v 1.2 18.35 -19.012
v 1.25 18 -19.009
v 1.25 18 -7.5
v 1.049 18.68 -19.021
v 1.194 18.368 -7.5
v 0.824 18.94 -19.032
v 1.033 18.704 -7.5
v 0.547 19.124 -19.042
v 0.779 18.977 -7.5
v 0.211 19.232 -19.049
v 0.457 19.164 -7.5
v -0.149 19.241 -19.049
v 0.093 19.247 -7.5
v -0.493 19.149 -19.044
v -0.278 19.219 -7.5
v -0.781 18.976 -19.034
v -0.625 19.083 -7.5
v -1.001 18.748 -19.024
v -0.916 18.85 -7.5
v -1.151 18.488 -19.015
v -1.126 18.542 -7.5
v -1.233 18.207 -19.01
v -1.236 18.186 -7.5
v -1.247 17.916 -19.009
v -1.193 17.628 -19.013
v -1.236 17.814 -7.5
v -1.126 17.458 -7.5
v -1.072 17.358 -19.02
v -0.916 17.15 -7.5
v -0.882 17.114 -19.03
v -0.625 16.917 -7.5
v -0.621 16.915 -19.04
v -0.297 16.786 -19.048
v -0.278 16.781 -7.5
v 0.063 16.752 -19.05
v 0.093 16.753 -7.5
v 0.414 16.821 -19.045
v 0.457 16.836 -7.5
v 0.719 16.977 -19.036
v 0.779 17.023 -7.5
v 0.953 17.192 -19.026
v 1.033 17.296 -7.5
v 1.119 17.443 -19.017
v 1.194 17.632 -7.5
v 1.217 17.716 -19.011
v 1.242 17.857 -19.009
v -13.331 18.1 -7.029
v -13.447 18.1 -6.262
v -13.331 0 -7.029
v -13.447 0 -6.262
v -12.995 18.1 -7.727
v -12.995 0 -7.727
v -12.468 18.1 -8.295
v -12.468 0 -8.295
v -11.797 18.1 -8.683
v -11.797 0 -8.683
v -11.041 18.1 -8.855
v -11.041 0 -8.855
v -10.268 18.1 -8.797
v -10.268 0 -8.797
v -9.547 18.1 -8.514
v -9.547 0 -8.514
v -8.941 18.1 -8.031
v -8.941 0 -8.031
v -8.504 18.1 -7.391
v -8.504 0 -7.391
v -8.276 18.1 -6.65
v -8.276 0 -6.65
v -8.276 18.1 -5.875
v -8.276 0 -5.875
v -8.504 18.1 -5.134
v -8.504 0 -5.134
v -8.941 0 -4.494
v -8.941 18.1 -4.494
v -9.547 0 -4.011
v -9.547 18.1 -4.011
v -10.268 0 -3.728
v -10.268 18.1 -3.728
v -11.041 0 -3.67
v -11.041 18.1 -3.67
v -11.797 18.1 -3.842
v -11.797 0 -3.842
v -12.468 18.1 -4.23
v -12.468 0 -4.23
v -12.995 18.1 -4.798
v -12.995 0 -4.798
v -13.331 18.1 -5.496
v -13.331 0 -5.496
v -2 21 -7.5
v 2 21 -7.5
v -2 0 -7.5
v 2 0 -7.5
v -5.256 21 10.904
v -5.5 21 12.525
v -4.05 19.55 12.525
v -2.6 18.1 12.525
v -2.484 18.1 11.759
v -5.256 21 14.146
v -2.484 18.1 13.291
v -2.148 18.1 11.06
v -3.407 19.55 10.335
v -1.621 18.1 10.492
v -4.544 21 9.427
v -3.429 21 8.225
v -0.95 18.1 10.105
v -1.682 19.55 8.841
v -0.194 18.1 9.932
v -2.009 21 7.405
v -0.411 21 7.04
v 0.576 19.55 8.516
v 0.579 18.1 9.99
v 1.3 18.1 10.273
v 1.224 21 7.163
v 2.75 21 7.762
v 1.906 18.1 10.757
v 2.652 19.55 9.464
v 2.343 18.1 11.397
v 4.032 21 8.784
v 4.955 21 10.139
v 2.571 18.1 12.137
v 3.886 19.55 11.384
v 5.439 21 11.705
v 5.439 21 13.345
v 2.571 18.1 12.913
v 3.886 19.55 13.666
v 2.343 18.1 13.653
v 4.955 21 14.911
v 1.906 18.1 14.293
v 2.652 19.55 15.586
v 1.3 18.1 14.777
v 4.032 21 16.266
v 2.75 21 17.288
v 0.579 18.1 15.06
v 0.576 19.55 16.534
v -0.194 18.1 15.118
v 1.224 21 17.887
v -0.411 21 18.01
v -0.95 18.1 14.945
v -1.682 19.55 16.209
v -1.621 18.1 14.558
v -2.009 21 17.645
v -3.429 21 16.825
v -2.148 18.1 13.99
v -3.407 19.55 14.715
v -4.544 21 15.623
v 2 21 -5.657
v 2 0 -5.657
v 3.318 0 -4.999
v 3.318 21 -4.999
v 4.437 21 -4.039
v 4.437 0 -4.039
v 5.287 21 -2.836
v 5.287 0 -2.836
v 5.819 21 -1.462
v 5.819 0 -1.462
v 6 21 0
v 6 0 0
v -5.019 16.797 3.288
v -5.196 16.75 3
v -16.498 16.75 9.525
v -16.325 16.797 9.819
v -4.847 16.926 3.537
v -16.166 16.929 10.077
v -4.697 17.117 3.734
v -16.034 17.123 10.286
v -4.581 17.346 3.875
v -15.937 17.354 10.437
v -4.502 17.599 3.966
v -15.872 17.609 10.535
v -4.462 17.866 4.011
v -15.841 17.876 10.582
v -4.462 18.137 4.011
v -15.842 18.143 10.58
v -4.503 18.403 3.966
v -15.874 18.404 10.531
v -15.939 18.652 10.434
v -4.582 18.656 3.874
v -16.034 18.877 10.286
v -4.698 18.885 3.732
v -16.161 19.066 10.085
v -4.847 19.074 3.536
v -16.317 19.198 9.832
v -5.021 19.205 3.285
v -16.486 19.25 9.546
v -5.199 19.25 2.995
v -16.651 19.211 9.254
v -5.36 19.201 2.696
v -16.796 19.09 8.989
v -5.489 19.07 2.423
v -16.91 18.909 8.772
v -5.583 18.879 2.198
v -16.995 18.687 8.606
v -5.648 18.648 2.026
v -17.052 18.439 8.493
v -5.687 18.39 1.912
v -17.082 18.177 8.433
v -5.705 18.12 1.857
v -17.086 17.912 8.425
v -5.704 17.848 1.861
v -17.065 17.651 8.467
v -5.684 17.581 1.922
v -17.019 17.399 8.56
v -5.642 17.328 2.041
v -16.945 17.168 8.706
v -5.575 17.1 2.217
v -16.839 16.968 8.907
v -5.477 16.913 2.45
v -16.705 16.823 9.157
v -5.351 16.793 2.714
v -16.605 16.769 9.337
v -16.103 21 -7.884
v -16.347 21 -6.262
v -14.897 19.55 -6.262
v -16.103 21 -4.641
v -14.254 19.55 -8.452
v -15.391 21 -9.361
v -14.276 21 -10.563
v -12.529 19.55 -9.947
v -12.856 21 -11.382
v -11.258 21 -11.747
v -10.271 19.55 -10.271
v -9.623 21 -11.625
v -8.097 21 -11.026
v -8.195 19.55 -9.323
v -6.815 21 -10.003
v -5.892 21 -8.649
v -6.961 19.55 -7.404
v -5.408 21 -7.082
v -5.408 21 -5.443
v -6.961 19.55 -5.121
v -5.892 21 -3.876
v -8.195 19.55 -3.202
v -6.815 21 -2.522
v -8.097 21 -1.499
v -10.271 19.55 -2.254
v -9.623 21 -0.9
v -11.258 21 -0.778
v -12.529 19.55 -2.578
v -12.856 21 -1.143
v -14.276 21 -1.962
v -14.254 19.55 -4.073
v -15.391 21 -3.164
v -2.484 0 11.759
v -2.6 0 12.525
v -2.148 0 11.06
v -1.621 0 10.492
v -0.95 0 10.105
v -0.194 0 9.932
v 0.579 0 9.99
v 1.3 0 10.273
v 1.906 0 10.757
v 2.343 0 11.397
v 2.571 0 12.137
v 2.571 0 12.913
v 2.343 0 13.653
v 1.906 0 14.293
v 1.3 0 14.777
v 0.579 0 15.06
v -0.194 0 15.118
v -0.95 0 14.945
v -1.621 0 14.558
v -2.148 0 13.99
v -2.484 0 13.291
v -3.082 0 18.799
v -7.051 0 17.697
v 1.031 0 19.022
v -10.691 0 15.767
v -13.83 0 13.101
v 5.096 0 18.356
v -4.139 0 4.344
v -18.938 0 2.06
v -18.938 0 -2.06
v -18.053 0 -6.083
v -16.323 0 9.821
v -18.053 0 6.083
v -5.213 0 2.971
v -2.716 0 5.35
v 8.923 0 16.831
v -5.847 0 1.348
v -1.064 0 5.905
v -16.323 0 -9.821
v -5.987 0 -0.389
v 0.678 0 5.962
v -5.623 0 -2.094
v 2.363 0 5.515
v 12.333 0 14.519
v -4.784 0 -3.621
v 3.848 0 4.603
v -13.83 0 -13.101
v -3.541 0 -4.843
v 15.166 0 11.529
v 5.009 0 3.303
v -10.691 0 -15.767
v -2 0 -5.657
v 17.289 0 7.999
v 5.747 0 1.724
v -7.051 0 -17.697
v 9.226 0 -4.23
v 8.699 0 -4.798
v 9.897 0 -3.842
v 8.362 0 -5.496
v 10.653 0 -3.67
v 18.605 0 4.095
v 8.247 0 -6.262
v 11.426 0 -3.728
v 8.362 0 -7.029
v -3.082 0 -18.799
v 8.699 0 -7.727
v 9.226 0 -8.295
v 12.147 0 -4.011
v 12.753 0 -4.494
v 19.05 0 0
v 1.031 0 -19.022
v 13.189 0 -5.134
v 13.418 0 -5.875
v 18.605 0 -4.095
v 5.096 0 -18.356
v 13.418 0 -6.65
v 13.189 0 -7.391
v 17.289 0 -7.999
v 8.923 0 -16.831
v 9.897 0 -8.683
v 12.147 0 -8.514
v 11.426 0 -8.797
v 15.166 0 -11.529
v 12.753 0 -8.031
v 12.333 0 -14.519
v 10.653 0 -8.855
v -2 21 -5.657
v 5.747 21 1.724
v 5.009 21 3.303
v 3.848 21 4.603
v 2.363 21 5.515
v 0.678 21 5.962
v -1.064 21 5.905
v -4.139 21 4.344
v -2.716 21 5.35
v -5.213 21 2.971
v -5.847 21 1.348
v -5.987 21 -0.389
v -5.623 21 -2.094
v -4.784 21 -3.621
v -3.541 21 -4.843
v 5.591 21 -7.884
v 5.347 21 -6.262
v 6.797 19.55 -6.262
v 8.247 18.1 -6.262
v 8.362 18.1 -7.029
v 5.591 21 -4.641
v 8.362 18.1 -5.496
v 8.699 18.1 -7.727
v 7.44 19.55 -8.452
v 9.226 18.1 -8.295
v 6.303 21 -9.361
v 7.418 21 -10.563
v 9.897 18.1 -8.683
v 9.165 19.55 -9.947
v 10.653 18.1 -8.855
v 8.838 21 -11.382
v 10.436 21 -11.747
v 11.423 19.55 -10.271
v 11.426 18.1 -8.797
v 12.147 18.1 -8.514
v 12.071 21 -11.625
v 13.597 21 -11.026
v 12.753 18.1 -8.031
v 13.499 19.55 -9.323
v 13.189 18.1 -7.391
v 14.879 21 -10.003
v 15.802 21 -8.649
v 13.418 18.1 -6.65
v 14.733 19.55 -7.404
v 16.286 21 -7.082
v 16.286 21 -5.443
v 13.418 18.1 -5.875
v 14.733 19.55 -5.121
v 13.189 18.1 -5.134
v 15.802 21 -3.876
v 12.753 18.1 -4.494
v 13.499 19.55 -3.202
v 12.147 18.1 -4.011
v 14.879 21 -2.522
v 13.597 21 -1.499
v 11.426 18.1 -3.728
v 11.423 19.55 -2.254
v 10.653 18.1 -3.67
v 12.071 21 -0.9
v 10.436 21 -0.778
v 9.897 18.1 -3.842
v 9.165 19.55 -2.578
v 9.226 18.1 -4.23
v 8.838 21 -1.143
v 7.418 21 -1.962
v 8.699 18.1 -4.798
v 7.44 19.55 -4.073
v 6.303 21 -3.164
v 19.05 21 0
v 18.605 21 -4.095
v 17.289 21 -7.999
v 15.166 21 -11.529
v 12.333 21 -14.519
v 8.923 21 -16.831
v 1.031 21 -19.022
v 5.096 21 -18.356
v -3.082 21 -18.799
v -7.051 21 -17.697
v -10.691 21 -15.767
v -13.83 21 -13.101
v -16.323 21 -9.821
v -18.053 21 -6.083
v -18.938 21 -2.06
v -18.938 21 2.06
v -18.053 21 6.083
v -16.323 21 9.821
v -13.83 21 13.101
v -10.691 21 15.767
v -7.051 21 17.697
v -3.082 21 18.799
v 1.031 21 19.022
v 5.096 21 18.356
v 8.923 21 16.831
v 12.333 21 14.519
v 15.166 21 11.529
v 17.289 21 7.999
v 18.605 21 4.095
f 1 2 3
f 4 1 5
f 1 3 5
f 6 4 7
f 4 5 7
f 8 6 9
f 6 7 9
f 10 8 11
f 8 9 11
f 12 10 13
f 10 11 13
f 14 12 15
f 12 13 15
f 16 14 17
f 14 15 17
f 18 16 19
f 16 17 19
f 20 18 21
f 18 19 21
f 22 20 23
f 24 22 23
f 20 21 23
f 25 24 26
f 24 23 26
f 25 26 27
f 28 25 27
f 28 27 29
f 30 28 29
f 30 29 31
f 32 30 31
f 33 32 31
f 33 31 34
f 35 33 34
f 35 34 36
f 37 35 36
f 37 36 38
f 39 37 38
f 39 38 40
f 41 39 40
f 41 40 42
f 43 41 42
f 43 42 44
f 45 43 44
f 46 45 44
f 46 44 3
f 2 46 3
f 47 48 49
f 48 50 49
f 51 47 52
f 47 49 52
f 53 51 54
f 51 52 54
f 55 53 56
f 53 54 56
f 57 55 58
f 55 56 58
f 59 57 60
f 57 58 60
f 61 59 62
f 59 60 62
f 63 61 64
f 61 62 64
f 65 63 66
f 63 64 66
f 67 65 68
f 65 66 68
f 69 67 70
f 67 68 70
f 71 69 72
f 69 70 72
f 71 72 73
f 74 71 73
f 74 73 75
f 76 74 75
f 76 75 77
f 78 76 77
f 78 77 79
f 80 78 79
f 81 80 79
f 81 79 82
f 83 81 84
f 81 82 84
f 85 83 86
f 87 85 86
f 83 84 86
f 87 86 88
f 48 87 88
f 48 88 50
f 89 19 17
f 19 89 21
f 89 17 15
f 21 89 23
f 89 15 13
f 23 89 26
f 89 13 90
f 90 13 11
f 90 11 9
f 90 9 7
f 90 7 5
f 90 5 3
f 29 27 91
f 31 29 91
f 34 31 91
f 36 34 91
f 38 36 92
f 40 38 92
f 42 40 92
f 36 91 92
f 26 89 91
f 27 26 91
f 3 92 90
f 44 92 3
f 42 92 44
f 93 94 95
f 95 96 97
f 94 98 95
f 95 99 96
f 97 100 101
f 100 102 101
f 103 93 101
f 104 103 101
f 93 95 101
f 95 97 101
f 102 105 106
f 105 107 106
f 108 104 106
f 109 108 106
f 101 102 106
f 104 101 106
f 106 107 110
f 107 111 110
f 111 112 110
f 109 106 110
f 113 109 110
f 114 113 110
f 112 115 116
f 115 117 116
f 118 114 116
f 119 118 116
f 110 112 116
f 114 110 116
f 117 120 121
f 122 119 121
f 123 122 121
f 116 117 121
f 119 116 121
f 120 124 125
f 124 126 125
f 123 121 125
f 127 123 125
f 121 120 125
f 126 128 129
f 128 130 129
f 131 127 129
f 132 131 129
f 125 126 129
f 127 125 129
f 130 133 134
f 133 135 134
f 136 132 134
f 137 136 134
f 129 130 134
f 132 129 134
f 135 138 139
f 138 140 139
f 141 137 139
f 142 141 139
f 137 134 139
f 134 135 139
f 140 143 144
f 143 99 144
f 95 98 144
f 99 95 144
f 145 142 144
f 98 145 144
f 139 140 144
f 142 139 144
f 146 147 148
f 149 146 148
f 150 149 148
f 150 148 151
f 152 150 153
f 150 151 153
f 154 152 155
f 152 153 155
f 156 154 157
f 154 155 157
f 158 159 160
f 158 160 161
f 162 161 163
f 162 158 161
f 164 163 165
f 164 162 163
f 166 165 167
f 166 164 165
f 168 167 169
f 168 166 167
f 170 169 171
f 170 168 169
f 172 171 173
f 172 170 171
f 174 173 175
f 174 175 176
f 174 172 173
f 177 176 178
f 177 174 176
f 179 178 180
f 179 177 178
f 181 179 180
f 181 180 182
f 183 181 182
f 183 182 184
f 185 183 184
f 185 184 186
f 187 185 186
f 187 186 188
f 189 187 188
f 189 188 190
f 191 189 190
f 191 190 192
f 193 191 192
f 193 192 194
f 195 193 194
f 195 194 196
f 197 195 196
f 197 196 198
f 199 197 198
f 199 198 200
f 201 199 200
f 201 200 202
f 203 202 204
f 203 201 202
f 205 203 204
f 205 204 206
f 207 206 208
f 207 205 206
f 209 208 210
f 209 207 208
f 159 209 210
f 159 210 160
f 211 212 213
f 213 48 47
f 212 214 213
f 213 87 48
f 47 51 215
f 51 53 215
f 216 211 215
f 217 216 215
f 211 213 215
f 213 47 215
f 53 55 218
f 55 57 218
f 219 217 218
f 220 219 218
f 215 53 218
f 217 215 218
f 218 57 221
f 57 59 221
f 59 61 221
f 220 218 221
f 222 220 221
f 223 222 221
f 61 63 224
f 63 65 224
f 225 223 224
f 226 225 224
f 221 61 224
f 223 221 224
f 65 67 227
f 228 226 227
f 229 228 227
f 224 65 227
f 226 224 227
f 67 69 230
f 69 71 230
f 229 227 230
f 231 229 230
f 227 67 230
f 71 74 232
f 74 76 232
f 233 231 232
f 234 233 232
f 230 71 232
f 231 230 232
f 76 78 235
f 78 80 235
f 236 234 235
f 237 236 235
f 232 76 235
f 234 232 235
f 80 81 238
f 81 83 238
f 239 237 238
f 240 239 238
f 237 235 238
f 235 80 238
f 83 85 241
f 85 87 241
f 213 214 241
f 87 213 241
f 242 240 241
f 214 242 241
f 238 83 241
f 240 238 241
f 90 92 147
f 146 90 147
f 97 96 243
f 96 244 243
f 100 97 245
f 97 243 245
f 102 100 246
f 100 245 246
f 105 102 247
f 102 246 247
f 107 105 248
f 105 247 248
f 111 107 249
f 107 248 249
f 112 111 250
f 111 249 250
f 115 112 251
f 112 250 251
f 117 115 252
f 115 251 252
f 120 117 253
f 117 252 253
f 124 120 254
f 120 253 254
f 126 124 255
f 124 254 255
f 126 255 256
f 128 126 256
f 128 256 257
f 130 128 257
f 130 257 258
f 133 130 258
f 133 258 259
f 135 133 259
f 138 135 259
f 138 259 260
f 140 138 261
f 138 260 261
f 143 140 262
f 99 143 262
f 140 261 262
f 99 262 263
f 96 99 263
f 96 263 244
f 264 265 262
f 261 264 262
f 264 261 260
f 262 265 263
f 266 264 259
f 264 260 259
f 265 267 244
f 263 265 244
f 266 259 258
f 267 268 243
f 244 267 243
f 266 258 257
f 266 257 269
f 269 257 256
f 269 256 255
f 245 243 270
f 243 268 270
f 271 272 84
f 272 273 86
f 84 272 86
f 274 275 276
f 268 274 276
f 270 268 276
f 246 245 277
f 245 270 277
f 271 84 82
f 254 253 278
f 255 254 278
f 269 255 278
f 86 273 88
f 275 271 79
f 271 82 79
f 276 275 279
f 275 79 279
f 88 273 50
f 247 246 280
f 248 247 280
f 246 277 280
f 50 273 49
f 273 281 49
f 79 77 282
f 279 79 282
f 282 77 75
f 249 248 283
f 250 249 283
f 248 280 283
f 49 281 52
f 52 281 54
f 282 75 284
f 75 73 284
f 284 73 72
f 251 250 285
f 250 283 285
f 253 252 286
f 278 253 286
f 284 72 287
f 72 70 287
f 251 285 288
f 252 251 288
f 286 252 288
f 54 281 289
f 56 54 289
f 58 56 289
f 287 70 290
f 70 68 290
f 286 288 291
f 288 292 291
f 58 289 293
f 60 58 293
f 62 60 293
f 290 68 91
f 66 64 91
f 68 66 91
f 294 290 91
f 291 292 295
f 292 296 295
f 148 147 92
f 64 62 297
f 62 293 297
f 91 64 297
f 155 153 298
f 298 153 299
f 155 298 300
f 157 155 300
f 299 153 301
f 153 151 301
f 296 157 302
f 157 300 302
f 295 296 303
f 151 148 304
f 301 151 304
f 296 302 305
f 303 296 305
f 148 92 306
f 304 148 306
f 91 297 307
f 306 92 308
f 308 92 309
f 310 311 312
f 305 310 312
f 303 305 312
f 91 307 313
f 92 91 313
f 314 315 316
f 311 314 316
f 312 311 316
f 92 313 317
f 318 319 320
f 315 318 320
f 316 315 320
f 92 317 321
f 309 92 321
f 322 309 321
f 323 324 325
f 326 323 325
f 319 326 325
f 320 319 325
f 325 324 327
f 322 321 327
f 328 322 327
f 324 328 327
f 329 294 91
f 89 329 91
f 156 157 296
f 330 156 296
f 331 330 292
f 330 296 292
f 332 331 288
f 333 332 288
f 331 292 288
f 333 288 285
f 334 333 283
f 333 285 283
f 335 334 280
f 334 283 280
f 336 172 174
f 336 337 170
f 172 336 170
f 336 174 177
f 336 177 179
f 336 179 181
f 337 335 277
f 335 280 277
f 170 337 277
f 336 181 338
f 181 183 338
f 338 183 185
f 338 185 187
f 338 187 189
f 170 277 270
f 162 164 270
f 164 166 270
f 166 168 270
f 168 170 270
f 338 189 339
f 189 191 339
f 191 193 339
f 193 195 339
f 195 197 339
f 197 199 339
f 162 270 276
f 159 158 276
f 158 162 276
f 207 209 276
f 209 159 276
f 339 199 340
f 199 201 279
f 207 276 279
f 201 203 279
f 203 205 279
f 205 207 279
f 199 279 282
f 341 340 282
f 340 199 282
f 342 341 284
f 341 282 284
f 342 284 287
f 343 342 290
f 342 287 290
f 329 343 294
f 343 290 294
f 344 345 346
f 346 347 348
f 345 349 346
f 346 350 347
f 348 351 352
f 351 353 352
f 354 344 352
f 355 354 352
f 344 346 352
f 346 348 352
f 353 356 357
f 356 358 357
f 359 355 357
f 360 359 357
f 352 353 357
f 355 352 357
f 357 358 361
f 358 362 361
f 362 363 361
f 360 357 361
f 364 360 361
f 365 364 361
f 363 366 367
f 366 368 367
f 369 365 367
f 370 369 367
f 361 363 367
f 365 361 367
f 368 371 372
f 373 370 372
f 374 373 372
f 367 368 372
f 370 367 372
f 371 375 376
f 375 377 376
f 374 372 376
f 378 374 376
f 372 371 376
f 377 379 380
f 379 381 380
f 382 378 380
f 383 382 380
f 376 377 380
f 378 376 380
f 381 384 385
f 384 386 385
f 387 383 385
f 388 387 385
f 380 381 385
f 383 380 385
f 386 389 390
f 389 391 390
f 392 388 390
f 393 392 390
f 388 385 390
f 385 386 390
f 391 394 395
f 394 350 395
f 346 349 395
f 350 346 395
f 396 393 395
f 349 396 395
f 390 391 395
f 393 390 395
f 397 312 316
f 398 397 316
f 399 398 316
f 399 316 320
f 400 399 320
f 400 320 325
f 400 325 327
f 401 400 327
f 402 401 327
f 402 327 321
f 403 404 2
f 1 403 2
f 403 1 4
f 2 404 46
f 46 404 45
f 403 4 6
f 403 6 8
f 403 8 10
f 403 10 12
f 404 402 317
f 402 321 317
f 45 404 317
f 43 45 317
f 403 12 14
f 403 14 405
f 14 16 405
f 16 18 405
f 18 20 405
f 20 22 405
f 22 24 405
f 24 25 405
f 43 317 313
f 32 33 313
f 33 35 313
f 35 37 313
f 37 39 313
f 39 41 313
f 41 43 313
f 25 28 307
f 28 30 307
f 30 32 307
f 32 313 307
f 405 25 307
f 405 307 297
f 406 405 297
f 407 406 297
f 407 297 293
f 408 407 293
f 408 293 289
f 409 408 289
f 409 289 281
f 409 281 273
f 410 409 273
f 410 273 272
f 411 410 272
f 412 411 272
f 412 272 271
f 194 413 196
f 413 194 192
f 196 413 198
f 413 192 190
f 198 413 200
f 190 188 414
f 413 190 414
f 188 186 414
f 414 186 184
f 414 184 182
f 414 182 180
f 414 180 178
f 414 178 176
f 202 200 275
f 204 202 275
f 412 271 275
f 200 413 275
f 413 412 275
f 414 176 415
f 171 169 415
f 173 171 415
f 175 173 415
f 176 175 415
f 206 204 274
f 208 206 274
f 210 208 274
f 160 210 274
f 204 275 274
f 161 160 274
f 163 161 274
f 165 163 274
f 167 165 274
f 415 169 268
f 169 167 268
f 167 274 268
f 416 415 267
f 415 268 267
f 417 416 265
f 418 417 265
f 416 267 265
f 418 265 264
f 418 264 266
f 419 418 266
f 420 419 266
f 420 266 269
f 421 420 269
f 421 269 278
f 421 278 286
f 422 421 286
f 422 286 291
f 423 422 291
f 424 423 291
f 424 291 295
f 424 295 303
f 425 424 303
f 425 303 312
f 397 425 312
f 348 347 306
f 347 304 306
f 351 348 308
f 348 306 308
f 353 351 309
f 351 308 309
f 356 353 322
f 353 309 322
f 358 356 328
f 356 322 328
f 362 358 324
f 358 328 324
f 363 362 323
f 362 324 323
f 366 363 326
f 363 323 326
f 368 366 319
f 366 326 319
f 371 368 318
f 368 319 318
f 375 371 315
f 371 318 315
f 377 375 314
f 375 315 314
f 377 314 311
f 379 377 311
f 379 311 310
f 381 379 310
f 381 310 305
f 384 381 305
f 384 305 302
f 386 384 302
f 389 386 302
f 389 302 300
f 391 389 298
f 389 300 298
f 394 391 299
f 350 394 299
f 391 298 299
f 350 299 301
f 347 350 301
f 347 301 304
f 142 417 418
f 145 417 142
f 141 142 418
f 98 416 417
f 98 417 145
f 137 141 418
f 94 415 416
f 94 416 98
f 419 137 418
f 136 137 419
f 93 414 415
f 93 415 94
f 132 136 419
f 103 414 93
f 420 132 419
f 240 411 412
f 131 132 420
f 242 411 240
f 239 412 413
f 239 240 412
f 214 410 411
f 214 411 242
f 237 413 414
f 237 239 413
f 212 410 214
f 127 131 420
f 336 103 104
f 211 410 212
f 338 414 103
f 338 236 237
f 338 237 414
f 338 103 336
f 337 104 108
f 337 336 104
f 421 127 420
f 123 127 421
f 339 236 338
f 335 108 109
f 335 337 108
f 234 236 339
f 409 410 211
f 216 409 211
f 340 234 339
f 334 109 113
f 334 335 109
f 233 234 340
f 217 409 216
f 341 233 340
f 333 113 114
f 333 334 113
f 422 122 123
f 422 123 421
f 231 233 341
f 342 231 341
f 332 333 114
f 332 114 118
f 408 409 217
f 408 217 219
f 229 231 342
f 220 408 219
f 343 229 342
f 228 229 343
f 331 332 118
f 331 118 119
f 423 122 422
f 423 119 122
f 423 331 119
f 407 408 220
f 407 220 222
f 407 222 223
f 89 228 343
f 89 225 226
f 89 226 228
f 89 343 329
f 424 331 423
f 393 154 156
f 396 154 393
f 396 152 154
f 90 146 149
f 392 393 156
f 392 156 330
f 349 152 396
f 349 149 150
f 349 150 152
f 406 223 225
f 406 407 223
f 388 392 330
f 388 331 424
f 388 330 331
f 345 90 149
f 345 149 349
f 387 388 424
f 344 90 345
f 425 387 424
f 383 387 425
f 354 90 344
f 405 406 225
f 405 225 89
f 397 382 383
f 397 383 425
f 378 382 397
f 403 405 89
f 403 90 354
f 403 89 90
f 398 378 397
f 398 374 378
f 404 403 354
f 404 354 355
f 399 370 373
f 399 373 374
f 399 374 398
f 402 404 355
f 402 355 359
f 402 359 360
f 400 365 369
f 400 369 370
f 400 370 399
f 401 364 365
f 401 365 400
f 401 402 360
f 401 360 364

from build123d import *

# Parameters (mm, degrees)
SKETCH1_R                     = 19.05
SKETCH1_R_2                   = 2.5
BOSS_EXTRUDE1_DEPTH           = 21
SKETCH2_R                     = 1.25
CUT_EXTRUDE1_DEPTH            = 3
CUT_EXTRUDE1_DEPTH_BACK       = 15
SKETCH4_R                     = 1.25
CUT_EXTRUDE2_DEPTH            = 20
CSK_FOR_M5_SFHCS1_D           = 5.2
CSK_FOR_M5_SFHCS1_CSINK_D     = 11
CSK_FOR_M5_SFHCS1_CSINK_ANGLE = 90


with BuildPart() as part:
    # Sketch1 → Boss-Extrude1 (new body)
    with BuildSketch(Plane(origin=(0, 0, 0), x_dir=(1, 0, 0), z_dir=(0, 1, 0))):
        Circle(SKETCH1_R)
        with Locations((0, -12.525)):
            Circle(SKETCH1_R_2, mode=Mode.SUBTRACT)
        with Locations((-10.846968182, 6.2625)):
            Circle(SKETCH1_R_2, mode=Mode.SUBTRACT)
        with BuildLine():
            Line((-2, 5.656854249), (-2, 7.5))
            Line((-2, 7.5), (-1, 7.5))
            Line((-1, 7.5), (1, 7.5))
            Line((1, 7.5), (2, 7.5))
            Line((2, 7.5), (2, 5.656854249))
            ThreePointArc((2, 5.656854249), (4.898979486, 3.464101615), (6, 0))
            ThreePointArc((6, 0), (-3.464101615, -4.898979486), (-2, 5.656854249))
        make_face(mode=Mode.SUBTRACT)
        with Locations((10.846968182, 6.2625)):
            Circle(SKETCH1_R_2, mode=Mode.SUBTRACT)
        with Locations((-10.846968182, 6.2625)):
            Circle(SKETCH1_R_2)
        with Locations((10.846968182, 6.2625)):
            Circle(SKETCH1_R_2)
        with Locations((0, -12.525)):
            Circle(SKETCH1_R_2)
    extrude(amount=BOSS_EXTRUDE1_DEPTH)

    # Sketch2 → Cut-Extrude1 (cut, two sides)
    with BuildSketch(Plane.XY.offset(-7.5)) as cut_extrude1_sk:
        with Locations((0, 18)):
            Circle(SKETCH2_R)
    extrude(amount=CUT_EXTRUDE1_DEPTH, mode=Mode.SUBTRACT)
    extrude(cut_extrude1_sk.sketch, amount=-CUT_EXTRUDE1_DEPTH_BACK, mode=Mode.SUBTRACT)

    # Sketch4 → Cut-Extrude2 (cut)
    with BuildSketch(Plane(origin=(0, 0, 0), x_dir=(0, -1, 0), z_dir=(-0.866025404, 0, 0.5))):
        with Locations((-18, 0)):
            Circle(SKETCH4_R)
    extrude(amount=CUT_EXTRUDE2_DEPTH, mode=Mode.SUBTRACT)

    # CSK for M5 SFHCS1 (through all)
    with Locations(Plane(origin=(0, 21, 0), x_dir=(1, 0, 0), z_dir=(0, 1, 0))):
        with Locations((10.846968182, 6.2625), (0, -12.525), (-10.846968182, 6.2625), (0, 0)):
            CounterSinkHole(CSK_FOR_M5_SFHCS1_D / 2, CSK_FOR_M5_SFHCS1_CSINK_D / 2, counter_sink_angle=CSK_FOR_M5_SFHCS1_CSINK_ANGLE)


solid = part.part
